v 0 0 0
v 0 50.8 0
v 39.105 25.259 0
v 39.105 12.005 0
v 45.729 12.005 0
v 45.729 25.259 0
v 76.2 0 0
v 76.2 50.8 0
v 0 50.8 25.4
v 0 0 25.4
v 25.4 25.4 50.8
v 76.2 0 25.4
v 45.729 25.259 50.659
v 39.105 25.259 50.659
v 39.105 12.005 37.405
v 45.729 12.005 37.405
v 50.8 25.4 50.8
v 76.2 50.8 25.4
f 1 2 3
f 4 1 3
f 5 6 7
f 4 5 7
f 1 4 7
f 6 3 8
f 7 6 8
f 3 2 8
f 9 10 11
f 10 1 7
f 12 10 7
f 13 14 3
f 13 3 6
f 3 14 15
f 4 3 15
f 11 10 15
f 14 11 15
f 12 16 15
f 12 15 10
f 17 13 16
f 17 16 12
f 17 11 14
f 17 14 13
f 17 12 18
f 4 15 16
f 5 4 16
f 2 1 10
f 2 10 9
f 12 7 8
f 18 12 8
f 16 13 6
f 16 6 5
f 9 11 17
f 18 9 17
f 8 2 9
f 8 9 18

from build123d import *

# Parameters (mm, degrees)
F0_W     = 76.2
F0_H     = 50.8
F1_DEPTH = 50.8
F3_SIZE  = 25.39999
F4_W     = 6.6249594092
F4_H     = 13.2540166378
F5_DEPTH = 50.801


# Not quite as in the source:
# - a fillet or chamfer is up to 0.001 mm smaller than in the source, because OpenCascade refuses the exact size


with BuildPart() as f1:
    # F0 (on Top) → F1 (new body)
    with BuildSketch(Plane.XY):
        with Locations((38.1, 25.4)):
            Rectangle(F0_W, F0_H)
    extrude(amount=F1_DEPTH)

    # F3 (size 25.4 in the source; OpenCascade refuses exactly that, so slightly less here)
    f3_edges = [f1.edges().sort_by_distance(p)[0] for p in [
        (0, 25.4, 50.8),
        (76.2, 25.4, 50.8),
        (38.1, 0, 50.8),
        (38.1, 50.8, 50.8),
    ]]
    chamfer(f3_edges, length=F3_SIZE)

    # F4 (on face) → F5 (cut, through all)
    with BuildSketch(Plane(origin=(0, 0, 0), x_dir=(1, 0, 0), z_dir=(0, 0, -1))):
        with Locations((42.4170047045, -18.6321474612)):
            Rectangle(F4_W, F4_H)
    extrude(amount=-F5_DEPTH, mode=Mode.SUBTRACT)


solid = f1.part
